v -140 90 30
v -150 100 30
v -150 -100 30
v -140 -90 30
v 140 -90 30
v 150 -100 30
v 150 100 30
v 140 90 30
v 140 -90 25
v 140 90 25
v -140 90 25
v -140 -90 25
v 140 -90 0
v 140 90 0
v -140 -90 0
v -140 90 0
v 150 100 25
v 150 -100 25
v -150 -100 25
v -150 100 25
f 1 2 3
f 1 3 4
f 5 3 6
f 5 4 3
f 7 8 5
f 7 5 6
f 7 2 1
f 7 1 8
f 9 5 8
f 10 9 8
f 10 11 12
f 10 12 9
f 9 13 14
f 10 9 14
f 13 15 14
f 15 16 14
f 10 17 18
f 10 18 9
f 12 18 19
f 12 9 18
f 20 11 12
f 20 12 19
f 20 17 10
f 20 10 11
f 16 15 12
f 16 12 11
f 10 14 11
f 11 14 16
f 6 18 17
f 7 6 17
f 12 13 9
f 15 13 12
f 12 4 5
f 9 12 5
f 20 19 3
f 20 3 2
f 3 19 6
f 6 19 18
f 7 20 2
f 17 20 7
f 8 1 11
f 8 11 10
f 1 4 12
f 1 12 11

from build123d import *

# Parameters (mm, degrees)
SKETCH_1_W           = 300
SKETCH_1_H           = 200
EXTRUDE_1_DEPTH      = 30
SKETCH_2_W           = 280
SKETCH_2_H           = 180
CUT_EXTRUDE_1_DEPTH  = 5
SKETCH_3_OUTSIDE_W   = 374.36
SKETCH_3_OUTSIDE_H   = 274.36
SKETCH_3_OUTSIDE_W_2 = 280
SKETCH_3_OUTSIDE_H_2 = 180
CUT_EXTRUDE_2_DEPTH  = 25


with BuildPart() as part:
    # 草图1 → 凸台-拉伸1 (new body)
    with BuildSketch(Plane.XY):
        Rectangle(SKETCH_1_W, SKETCH_1_H)
    extrude(amount=EXTRUDE_1_DEPTH)

    # 草图2 → 切除-拉伸1 (cut)
    with BuildSketch(Plane.XY.offset(30)):
        Rectangle(SKETCH_2_W, SKETCH_2_H)
    extrude(amount=-CUT_EXTRUDE_1_DEPTH, mode=Mode.SUBTRACT)

    # 草图3 outside → 切除-拉伸2 (cut)
    with BuildSketch(Plane(origin=(0, 0, 0), x_dir=(-1, 0, 0), z_dir=(0, 0, -1))):
        Rectangle(SKETCH_3_OUTSIDE_W, SKETCH_3_OUTSIDE_H)
        Rectangle(SKETCH_3_OUTSIDE_W_2, SKETCH_3_OUTSIDE_H_2, mode=Mode.SUBTRACT)
    extrude(amount=-CUT_EXTRUDE_2_DEPTH, mode=Mode.SUBTRACT)


with BuildPart() as cut_extrude_2_piece_1:
    # of the separate pieces the step leaves, piece 1, a body of its own (cut_extrude_2_pieces)
    add(part.part.solids().sort_by_distance((-140, -90, 0))[0])


with BuildPart() as cut_extrude_2_piece_2:
    # of the separate pieces the step leaves, piece 2, a body of its own (cut_extrude_2_pieces)
    add(part.part.solids().sort_by_distance((-150, -100, 25))[0])


solid = Compound([cut_extrude_2_piece_1.part, cut_extrude_2_piece_2.part])
